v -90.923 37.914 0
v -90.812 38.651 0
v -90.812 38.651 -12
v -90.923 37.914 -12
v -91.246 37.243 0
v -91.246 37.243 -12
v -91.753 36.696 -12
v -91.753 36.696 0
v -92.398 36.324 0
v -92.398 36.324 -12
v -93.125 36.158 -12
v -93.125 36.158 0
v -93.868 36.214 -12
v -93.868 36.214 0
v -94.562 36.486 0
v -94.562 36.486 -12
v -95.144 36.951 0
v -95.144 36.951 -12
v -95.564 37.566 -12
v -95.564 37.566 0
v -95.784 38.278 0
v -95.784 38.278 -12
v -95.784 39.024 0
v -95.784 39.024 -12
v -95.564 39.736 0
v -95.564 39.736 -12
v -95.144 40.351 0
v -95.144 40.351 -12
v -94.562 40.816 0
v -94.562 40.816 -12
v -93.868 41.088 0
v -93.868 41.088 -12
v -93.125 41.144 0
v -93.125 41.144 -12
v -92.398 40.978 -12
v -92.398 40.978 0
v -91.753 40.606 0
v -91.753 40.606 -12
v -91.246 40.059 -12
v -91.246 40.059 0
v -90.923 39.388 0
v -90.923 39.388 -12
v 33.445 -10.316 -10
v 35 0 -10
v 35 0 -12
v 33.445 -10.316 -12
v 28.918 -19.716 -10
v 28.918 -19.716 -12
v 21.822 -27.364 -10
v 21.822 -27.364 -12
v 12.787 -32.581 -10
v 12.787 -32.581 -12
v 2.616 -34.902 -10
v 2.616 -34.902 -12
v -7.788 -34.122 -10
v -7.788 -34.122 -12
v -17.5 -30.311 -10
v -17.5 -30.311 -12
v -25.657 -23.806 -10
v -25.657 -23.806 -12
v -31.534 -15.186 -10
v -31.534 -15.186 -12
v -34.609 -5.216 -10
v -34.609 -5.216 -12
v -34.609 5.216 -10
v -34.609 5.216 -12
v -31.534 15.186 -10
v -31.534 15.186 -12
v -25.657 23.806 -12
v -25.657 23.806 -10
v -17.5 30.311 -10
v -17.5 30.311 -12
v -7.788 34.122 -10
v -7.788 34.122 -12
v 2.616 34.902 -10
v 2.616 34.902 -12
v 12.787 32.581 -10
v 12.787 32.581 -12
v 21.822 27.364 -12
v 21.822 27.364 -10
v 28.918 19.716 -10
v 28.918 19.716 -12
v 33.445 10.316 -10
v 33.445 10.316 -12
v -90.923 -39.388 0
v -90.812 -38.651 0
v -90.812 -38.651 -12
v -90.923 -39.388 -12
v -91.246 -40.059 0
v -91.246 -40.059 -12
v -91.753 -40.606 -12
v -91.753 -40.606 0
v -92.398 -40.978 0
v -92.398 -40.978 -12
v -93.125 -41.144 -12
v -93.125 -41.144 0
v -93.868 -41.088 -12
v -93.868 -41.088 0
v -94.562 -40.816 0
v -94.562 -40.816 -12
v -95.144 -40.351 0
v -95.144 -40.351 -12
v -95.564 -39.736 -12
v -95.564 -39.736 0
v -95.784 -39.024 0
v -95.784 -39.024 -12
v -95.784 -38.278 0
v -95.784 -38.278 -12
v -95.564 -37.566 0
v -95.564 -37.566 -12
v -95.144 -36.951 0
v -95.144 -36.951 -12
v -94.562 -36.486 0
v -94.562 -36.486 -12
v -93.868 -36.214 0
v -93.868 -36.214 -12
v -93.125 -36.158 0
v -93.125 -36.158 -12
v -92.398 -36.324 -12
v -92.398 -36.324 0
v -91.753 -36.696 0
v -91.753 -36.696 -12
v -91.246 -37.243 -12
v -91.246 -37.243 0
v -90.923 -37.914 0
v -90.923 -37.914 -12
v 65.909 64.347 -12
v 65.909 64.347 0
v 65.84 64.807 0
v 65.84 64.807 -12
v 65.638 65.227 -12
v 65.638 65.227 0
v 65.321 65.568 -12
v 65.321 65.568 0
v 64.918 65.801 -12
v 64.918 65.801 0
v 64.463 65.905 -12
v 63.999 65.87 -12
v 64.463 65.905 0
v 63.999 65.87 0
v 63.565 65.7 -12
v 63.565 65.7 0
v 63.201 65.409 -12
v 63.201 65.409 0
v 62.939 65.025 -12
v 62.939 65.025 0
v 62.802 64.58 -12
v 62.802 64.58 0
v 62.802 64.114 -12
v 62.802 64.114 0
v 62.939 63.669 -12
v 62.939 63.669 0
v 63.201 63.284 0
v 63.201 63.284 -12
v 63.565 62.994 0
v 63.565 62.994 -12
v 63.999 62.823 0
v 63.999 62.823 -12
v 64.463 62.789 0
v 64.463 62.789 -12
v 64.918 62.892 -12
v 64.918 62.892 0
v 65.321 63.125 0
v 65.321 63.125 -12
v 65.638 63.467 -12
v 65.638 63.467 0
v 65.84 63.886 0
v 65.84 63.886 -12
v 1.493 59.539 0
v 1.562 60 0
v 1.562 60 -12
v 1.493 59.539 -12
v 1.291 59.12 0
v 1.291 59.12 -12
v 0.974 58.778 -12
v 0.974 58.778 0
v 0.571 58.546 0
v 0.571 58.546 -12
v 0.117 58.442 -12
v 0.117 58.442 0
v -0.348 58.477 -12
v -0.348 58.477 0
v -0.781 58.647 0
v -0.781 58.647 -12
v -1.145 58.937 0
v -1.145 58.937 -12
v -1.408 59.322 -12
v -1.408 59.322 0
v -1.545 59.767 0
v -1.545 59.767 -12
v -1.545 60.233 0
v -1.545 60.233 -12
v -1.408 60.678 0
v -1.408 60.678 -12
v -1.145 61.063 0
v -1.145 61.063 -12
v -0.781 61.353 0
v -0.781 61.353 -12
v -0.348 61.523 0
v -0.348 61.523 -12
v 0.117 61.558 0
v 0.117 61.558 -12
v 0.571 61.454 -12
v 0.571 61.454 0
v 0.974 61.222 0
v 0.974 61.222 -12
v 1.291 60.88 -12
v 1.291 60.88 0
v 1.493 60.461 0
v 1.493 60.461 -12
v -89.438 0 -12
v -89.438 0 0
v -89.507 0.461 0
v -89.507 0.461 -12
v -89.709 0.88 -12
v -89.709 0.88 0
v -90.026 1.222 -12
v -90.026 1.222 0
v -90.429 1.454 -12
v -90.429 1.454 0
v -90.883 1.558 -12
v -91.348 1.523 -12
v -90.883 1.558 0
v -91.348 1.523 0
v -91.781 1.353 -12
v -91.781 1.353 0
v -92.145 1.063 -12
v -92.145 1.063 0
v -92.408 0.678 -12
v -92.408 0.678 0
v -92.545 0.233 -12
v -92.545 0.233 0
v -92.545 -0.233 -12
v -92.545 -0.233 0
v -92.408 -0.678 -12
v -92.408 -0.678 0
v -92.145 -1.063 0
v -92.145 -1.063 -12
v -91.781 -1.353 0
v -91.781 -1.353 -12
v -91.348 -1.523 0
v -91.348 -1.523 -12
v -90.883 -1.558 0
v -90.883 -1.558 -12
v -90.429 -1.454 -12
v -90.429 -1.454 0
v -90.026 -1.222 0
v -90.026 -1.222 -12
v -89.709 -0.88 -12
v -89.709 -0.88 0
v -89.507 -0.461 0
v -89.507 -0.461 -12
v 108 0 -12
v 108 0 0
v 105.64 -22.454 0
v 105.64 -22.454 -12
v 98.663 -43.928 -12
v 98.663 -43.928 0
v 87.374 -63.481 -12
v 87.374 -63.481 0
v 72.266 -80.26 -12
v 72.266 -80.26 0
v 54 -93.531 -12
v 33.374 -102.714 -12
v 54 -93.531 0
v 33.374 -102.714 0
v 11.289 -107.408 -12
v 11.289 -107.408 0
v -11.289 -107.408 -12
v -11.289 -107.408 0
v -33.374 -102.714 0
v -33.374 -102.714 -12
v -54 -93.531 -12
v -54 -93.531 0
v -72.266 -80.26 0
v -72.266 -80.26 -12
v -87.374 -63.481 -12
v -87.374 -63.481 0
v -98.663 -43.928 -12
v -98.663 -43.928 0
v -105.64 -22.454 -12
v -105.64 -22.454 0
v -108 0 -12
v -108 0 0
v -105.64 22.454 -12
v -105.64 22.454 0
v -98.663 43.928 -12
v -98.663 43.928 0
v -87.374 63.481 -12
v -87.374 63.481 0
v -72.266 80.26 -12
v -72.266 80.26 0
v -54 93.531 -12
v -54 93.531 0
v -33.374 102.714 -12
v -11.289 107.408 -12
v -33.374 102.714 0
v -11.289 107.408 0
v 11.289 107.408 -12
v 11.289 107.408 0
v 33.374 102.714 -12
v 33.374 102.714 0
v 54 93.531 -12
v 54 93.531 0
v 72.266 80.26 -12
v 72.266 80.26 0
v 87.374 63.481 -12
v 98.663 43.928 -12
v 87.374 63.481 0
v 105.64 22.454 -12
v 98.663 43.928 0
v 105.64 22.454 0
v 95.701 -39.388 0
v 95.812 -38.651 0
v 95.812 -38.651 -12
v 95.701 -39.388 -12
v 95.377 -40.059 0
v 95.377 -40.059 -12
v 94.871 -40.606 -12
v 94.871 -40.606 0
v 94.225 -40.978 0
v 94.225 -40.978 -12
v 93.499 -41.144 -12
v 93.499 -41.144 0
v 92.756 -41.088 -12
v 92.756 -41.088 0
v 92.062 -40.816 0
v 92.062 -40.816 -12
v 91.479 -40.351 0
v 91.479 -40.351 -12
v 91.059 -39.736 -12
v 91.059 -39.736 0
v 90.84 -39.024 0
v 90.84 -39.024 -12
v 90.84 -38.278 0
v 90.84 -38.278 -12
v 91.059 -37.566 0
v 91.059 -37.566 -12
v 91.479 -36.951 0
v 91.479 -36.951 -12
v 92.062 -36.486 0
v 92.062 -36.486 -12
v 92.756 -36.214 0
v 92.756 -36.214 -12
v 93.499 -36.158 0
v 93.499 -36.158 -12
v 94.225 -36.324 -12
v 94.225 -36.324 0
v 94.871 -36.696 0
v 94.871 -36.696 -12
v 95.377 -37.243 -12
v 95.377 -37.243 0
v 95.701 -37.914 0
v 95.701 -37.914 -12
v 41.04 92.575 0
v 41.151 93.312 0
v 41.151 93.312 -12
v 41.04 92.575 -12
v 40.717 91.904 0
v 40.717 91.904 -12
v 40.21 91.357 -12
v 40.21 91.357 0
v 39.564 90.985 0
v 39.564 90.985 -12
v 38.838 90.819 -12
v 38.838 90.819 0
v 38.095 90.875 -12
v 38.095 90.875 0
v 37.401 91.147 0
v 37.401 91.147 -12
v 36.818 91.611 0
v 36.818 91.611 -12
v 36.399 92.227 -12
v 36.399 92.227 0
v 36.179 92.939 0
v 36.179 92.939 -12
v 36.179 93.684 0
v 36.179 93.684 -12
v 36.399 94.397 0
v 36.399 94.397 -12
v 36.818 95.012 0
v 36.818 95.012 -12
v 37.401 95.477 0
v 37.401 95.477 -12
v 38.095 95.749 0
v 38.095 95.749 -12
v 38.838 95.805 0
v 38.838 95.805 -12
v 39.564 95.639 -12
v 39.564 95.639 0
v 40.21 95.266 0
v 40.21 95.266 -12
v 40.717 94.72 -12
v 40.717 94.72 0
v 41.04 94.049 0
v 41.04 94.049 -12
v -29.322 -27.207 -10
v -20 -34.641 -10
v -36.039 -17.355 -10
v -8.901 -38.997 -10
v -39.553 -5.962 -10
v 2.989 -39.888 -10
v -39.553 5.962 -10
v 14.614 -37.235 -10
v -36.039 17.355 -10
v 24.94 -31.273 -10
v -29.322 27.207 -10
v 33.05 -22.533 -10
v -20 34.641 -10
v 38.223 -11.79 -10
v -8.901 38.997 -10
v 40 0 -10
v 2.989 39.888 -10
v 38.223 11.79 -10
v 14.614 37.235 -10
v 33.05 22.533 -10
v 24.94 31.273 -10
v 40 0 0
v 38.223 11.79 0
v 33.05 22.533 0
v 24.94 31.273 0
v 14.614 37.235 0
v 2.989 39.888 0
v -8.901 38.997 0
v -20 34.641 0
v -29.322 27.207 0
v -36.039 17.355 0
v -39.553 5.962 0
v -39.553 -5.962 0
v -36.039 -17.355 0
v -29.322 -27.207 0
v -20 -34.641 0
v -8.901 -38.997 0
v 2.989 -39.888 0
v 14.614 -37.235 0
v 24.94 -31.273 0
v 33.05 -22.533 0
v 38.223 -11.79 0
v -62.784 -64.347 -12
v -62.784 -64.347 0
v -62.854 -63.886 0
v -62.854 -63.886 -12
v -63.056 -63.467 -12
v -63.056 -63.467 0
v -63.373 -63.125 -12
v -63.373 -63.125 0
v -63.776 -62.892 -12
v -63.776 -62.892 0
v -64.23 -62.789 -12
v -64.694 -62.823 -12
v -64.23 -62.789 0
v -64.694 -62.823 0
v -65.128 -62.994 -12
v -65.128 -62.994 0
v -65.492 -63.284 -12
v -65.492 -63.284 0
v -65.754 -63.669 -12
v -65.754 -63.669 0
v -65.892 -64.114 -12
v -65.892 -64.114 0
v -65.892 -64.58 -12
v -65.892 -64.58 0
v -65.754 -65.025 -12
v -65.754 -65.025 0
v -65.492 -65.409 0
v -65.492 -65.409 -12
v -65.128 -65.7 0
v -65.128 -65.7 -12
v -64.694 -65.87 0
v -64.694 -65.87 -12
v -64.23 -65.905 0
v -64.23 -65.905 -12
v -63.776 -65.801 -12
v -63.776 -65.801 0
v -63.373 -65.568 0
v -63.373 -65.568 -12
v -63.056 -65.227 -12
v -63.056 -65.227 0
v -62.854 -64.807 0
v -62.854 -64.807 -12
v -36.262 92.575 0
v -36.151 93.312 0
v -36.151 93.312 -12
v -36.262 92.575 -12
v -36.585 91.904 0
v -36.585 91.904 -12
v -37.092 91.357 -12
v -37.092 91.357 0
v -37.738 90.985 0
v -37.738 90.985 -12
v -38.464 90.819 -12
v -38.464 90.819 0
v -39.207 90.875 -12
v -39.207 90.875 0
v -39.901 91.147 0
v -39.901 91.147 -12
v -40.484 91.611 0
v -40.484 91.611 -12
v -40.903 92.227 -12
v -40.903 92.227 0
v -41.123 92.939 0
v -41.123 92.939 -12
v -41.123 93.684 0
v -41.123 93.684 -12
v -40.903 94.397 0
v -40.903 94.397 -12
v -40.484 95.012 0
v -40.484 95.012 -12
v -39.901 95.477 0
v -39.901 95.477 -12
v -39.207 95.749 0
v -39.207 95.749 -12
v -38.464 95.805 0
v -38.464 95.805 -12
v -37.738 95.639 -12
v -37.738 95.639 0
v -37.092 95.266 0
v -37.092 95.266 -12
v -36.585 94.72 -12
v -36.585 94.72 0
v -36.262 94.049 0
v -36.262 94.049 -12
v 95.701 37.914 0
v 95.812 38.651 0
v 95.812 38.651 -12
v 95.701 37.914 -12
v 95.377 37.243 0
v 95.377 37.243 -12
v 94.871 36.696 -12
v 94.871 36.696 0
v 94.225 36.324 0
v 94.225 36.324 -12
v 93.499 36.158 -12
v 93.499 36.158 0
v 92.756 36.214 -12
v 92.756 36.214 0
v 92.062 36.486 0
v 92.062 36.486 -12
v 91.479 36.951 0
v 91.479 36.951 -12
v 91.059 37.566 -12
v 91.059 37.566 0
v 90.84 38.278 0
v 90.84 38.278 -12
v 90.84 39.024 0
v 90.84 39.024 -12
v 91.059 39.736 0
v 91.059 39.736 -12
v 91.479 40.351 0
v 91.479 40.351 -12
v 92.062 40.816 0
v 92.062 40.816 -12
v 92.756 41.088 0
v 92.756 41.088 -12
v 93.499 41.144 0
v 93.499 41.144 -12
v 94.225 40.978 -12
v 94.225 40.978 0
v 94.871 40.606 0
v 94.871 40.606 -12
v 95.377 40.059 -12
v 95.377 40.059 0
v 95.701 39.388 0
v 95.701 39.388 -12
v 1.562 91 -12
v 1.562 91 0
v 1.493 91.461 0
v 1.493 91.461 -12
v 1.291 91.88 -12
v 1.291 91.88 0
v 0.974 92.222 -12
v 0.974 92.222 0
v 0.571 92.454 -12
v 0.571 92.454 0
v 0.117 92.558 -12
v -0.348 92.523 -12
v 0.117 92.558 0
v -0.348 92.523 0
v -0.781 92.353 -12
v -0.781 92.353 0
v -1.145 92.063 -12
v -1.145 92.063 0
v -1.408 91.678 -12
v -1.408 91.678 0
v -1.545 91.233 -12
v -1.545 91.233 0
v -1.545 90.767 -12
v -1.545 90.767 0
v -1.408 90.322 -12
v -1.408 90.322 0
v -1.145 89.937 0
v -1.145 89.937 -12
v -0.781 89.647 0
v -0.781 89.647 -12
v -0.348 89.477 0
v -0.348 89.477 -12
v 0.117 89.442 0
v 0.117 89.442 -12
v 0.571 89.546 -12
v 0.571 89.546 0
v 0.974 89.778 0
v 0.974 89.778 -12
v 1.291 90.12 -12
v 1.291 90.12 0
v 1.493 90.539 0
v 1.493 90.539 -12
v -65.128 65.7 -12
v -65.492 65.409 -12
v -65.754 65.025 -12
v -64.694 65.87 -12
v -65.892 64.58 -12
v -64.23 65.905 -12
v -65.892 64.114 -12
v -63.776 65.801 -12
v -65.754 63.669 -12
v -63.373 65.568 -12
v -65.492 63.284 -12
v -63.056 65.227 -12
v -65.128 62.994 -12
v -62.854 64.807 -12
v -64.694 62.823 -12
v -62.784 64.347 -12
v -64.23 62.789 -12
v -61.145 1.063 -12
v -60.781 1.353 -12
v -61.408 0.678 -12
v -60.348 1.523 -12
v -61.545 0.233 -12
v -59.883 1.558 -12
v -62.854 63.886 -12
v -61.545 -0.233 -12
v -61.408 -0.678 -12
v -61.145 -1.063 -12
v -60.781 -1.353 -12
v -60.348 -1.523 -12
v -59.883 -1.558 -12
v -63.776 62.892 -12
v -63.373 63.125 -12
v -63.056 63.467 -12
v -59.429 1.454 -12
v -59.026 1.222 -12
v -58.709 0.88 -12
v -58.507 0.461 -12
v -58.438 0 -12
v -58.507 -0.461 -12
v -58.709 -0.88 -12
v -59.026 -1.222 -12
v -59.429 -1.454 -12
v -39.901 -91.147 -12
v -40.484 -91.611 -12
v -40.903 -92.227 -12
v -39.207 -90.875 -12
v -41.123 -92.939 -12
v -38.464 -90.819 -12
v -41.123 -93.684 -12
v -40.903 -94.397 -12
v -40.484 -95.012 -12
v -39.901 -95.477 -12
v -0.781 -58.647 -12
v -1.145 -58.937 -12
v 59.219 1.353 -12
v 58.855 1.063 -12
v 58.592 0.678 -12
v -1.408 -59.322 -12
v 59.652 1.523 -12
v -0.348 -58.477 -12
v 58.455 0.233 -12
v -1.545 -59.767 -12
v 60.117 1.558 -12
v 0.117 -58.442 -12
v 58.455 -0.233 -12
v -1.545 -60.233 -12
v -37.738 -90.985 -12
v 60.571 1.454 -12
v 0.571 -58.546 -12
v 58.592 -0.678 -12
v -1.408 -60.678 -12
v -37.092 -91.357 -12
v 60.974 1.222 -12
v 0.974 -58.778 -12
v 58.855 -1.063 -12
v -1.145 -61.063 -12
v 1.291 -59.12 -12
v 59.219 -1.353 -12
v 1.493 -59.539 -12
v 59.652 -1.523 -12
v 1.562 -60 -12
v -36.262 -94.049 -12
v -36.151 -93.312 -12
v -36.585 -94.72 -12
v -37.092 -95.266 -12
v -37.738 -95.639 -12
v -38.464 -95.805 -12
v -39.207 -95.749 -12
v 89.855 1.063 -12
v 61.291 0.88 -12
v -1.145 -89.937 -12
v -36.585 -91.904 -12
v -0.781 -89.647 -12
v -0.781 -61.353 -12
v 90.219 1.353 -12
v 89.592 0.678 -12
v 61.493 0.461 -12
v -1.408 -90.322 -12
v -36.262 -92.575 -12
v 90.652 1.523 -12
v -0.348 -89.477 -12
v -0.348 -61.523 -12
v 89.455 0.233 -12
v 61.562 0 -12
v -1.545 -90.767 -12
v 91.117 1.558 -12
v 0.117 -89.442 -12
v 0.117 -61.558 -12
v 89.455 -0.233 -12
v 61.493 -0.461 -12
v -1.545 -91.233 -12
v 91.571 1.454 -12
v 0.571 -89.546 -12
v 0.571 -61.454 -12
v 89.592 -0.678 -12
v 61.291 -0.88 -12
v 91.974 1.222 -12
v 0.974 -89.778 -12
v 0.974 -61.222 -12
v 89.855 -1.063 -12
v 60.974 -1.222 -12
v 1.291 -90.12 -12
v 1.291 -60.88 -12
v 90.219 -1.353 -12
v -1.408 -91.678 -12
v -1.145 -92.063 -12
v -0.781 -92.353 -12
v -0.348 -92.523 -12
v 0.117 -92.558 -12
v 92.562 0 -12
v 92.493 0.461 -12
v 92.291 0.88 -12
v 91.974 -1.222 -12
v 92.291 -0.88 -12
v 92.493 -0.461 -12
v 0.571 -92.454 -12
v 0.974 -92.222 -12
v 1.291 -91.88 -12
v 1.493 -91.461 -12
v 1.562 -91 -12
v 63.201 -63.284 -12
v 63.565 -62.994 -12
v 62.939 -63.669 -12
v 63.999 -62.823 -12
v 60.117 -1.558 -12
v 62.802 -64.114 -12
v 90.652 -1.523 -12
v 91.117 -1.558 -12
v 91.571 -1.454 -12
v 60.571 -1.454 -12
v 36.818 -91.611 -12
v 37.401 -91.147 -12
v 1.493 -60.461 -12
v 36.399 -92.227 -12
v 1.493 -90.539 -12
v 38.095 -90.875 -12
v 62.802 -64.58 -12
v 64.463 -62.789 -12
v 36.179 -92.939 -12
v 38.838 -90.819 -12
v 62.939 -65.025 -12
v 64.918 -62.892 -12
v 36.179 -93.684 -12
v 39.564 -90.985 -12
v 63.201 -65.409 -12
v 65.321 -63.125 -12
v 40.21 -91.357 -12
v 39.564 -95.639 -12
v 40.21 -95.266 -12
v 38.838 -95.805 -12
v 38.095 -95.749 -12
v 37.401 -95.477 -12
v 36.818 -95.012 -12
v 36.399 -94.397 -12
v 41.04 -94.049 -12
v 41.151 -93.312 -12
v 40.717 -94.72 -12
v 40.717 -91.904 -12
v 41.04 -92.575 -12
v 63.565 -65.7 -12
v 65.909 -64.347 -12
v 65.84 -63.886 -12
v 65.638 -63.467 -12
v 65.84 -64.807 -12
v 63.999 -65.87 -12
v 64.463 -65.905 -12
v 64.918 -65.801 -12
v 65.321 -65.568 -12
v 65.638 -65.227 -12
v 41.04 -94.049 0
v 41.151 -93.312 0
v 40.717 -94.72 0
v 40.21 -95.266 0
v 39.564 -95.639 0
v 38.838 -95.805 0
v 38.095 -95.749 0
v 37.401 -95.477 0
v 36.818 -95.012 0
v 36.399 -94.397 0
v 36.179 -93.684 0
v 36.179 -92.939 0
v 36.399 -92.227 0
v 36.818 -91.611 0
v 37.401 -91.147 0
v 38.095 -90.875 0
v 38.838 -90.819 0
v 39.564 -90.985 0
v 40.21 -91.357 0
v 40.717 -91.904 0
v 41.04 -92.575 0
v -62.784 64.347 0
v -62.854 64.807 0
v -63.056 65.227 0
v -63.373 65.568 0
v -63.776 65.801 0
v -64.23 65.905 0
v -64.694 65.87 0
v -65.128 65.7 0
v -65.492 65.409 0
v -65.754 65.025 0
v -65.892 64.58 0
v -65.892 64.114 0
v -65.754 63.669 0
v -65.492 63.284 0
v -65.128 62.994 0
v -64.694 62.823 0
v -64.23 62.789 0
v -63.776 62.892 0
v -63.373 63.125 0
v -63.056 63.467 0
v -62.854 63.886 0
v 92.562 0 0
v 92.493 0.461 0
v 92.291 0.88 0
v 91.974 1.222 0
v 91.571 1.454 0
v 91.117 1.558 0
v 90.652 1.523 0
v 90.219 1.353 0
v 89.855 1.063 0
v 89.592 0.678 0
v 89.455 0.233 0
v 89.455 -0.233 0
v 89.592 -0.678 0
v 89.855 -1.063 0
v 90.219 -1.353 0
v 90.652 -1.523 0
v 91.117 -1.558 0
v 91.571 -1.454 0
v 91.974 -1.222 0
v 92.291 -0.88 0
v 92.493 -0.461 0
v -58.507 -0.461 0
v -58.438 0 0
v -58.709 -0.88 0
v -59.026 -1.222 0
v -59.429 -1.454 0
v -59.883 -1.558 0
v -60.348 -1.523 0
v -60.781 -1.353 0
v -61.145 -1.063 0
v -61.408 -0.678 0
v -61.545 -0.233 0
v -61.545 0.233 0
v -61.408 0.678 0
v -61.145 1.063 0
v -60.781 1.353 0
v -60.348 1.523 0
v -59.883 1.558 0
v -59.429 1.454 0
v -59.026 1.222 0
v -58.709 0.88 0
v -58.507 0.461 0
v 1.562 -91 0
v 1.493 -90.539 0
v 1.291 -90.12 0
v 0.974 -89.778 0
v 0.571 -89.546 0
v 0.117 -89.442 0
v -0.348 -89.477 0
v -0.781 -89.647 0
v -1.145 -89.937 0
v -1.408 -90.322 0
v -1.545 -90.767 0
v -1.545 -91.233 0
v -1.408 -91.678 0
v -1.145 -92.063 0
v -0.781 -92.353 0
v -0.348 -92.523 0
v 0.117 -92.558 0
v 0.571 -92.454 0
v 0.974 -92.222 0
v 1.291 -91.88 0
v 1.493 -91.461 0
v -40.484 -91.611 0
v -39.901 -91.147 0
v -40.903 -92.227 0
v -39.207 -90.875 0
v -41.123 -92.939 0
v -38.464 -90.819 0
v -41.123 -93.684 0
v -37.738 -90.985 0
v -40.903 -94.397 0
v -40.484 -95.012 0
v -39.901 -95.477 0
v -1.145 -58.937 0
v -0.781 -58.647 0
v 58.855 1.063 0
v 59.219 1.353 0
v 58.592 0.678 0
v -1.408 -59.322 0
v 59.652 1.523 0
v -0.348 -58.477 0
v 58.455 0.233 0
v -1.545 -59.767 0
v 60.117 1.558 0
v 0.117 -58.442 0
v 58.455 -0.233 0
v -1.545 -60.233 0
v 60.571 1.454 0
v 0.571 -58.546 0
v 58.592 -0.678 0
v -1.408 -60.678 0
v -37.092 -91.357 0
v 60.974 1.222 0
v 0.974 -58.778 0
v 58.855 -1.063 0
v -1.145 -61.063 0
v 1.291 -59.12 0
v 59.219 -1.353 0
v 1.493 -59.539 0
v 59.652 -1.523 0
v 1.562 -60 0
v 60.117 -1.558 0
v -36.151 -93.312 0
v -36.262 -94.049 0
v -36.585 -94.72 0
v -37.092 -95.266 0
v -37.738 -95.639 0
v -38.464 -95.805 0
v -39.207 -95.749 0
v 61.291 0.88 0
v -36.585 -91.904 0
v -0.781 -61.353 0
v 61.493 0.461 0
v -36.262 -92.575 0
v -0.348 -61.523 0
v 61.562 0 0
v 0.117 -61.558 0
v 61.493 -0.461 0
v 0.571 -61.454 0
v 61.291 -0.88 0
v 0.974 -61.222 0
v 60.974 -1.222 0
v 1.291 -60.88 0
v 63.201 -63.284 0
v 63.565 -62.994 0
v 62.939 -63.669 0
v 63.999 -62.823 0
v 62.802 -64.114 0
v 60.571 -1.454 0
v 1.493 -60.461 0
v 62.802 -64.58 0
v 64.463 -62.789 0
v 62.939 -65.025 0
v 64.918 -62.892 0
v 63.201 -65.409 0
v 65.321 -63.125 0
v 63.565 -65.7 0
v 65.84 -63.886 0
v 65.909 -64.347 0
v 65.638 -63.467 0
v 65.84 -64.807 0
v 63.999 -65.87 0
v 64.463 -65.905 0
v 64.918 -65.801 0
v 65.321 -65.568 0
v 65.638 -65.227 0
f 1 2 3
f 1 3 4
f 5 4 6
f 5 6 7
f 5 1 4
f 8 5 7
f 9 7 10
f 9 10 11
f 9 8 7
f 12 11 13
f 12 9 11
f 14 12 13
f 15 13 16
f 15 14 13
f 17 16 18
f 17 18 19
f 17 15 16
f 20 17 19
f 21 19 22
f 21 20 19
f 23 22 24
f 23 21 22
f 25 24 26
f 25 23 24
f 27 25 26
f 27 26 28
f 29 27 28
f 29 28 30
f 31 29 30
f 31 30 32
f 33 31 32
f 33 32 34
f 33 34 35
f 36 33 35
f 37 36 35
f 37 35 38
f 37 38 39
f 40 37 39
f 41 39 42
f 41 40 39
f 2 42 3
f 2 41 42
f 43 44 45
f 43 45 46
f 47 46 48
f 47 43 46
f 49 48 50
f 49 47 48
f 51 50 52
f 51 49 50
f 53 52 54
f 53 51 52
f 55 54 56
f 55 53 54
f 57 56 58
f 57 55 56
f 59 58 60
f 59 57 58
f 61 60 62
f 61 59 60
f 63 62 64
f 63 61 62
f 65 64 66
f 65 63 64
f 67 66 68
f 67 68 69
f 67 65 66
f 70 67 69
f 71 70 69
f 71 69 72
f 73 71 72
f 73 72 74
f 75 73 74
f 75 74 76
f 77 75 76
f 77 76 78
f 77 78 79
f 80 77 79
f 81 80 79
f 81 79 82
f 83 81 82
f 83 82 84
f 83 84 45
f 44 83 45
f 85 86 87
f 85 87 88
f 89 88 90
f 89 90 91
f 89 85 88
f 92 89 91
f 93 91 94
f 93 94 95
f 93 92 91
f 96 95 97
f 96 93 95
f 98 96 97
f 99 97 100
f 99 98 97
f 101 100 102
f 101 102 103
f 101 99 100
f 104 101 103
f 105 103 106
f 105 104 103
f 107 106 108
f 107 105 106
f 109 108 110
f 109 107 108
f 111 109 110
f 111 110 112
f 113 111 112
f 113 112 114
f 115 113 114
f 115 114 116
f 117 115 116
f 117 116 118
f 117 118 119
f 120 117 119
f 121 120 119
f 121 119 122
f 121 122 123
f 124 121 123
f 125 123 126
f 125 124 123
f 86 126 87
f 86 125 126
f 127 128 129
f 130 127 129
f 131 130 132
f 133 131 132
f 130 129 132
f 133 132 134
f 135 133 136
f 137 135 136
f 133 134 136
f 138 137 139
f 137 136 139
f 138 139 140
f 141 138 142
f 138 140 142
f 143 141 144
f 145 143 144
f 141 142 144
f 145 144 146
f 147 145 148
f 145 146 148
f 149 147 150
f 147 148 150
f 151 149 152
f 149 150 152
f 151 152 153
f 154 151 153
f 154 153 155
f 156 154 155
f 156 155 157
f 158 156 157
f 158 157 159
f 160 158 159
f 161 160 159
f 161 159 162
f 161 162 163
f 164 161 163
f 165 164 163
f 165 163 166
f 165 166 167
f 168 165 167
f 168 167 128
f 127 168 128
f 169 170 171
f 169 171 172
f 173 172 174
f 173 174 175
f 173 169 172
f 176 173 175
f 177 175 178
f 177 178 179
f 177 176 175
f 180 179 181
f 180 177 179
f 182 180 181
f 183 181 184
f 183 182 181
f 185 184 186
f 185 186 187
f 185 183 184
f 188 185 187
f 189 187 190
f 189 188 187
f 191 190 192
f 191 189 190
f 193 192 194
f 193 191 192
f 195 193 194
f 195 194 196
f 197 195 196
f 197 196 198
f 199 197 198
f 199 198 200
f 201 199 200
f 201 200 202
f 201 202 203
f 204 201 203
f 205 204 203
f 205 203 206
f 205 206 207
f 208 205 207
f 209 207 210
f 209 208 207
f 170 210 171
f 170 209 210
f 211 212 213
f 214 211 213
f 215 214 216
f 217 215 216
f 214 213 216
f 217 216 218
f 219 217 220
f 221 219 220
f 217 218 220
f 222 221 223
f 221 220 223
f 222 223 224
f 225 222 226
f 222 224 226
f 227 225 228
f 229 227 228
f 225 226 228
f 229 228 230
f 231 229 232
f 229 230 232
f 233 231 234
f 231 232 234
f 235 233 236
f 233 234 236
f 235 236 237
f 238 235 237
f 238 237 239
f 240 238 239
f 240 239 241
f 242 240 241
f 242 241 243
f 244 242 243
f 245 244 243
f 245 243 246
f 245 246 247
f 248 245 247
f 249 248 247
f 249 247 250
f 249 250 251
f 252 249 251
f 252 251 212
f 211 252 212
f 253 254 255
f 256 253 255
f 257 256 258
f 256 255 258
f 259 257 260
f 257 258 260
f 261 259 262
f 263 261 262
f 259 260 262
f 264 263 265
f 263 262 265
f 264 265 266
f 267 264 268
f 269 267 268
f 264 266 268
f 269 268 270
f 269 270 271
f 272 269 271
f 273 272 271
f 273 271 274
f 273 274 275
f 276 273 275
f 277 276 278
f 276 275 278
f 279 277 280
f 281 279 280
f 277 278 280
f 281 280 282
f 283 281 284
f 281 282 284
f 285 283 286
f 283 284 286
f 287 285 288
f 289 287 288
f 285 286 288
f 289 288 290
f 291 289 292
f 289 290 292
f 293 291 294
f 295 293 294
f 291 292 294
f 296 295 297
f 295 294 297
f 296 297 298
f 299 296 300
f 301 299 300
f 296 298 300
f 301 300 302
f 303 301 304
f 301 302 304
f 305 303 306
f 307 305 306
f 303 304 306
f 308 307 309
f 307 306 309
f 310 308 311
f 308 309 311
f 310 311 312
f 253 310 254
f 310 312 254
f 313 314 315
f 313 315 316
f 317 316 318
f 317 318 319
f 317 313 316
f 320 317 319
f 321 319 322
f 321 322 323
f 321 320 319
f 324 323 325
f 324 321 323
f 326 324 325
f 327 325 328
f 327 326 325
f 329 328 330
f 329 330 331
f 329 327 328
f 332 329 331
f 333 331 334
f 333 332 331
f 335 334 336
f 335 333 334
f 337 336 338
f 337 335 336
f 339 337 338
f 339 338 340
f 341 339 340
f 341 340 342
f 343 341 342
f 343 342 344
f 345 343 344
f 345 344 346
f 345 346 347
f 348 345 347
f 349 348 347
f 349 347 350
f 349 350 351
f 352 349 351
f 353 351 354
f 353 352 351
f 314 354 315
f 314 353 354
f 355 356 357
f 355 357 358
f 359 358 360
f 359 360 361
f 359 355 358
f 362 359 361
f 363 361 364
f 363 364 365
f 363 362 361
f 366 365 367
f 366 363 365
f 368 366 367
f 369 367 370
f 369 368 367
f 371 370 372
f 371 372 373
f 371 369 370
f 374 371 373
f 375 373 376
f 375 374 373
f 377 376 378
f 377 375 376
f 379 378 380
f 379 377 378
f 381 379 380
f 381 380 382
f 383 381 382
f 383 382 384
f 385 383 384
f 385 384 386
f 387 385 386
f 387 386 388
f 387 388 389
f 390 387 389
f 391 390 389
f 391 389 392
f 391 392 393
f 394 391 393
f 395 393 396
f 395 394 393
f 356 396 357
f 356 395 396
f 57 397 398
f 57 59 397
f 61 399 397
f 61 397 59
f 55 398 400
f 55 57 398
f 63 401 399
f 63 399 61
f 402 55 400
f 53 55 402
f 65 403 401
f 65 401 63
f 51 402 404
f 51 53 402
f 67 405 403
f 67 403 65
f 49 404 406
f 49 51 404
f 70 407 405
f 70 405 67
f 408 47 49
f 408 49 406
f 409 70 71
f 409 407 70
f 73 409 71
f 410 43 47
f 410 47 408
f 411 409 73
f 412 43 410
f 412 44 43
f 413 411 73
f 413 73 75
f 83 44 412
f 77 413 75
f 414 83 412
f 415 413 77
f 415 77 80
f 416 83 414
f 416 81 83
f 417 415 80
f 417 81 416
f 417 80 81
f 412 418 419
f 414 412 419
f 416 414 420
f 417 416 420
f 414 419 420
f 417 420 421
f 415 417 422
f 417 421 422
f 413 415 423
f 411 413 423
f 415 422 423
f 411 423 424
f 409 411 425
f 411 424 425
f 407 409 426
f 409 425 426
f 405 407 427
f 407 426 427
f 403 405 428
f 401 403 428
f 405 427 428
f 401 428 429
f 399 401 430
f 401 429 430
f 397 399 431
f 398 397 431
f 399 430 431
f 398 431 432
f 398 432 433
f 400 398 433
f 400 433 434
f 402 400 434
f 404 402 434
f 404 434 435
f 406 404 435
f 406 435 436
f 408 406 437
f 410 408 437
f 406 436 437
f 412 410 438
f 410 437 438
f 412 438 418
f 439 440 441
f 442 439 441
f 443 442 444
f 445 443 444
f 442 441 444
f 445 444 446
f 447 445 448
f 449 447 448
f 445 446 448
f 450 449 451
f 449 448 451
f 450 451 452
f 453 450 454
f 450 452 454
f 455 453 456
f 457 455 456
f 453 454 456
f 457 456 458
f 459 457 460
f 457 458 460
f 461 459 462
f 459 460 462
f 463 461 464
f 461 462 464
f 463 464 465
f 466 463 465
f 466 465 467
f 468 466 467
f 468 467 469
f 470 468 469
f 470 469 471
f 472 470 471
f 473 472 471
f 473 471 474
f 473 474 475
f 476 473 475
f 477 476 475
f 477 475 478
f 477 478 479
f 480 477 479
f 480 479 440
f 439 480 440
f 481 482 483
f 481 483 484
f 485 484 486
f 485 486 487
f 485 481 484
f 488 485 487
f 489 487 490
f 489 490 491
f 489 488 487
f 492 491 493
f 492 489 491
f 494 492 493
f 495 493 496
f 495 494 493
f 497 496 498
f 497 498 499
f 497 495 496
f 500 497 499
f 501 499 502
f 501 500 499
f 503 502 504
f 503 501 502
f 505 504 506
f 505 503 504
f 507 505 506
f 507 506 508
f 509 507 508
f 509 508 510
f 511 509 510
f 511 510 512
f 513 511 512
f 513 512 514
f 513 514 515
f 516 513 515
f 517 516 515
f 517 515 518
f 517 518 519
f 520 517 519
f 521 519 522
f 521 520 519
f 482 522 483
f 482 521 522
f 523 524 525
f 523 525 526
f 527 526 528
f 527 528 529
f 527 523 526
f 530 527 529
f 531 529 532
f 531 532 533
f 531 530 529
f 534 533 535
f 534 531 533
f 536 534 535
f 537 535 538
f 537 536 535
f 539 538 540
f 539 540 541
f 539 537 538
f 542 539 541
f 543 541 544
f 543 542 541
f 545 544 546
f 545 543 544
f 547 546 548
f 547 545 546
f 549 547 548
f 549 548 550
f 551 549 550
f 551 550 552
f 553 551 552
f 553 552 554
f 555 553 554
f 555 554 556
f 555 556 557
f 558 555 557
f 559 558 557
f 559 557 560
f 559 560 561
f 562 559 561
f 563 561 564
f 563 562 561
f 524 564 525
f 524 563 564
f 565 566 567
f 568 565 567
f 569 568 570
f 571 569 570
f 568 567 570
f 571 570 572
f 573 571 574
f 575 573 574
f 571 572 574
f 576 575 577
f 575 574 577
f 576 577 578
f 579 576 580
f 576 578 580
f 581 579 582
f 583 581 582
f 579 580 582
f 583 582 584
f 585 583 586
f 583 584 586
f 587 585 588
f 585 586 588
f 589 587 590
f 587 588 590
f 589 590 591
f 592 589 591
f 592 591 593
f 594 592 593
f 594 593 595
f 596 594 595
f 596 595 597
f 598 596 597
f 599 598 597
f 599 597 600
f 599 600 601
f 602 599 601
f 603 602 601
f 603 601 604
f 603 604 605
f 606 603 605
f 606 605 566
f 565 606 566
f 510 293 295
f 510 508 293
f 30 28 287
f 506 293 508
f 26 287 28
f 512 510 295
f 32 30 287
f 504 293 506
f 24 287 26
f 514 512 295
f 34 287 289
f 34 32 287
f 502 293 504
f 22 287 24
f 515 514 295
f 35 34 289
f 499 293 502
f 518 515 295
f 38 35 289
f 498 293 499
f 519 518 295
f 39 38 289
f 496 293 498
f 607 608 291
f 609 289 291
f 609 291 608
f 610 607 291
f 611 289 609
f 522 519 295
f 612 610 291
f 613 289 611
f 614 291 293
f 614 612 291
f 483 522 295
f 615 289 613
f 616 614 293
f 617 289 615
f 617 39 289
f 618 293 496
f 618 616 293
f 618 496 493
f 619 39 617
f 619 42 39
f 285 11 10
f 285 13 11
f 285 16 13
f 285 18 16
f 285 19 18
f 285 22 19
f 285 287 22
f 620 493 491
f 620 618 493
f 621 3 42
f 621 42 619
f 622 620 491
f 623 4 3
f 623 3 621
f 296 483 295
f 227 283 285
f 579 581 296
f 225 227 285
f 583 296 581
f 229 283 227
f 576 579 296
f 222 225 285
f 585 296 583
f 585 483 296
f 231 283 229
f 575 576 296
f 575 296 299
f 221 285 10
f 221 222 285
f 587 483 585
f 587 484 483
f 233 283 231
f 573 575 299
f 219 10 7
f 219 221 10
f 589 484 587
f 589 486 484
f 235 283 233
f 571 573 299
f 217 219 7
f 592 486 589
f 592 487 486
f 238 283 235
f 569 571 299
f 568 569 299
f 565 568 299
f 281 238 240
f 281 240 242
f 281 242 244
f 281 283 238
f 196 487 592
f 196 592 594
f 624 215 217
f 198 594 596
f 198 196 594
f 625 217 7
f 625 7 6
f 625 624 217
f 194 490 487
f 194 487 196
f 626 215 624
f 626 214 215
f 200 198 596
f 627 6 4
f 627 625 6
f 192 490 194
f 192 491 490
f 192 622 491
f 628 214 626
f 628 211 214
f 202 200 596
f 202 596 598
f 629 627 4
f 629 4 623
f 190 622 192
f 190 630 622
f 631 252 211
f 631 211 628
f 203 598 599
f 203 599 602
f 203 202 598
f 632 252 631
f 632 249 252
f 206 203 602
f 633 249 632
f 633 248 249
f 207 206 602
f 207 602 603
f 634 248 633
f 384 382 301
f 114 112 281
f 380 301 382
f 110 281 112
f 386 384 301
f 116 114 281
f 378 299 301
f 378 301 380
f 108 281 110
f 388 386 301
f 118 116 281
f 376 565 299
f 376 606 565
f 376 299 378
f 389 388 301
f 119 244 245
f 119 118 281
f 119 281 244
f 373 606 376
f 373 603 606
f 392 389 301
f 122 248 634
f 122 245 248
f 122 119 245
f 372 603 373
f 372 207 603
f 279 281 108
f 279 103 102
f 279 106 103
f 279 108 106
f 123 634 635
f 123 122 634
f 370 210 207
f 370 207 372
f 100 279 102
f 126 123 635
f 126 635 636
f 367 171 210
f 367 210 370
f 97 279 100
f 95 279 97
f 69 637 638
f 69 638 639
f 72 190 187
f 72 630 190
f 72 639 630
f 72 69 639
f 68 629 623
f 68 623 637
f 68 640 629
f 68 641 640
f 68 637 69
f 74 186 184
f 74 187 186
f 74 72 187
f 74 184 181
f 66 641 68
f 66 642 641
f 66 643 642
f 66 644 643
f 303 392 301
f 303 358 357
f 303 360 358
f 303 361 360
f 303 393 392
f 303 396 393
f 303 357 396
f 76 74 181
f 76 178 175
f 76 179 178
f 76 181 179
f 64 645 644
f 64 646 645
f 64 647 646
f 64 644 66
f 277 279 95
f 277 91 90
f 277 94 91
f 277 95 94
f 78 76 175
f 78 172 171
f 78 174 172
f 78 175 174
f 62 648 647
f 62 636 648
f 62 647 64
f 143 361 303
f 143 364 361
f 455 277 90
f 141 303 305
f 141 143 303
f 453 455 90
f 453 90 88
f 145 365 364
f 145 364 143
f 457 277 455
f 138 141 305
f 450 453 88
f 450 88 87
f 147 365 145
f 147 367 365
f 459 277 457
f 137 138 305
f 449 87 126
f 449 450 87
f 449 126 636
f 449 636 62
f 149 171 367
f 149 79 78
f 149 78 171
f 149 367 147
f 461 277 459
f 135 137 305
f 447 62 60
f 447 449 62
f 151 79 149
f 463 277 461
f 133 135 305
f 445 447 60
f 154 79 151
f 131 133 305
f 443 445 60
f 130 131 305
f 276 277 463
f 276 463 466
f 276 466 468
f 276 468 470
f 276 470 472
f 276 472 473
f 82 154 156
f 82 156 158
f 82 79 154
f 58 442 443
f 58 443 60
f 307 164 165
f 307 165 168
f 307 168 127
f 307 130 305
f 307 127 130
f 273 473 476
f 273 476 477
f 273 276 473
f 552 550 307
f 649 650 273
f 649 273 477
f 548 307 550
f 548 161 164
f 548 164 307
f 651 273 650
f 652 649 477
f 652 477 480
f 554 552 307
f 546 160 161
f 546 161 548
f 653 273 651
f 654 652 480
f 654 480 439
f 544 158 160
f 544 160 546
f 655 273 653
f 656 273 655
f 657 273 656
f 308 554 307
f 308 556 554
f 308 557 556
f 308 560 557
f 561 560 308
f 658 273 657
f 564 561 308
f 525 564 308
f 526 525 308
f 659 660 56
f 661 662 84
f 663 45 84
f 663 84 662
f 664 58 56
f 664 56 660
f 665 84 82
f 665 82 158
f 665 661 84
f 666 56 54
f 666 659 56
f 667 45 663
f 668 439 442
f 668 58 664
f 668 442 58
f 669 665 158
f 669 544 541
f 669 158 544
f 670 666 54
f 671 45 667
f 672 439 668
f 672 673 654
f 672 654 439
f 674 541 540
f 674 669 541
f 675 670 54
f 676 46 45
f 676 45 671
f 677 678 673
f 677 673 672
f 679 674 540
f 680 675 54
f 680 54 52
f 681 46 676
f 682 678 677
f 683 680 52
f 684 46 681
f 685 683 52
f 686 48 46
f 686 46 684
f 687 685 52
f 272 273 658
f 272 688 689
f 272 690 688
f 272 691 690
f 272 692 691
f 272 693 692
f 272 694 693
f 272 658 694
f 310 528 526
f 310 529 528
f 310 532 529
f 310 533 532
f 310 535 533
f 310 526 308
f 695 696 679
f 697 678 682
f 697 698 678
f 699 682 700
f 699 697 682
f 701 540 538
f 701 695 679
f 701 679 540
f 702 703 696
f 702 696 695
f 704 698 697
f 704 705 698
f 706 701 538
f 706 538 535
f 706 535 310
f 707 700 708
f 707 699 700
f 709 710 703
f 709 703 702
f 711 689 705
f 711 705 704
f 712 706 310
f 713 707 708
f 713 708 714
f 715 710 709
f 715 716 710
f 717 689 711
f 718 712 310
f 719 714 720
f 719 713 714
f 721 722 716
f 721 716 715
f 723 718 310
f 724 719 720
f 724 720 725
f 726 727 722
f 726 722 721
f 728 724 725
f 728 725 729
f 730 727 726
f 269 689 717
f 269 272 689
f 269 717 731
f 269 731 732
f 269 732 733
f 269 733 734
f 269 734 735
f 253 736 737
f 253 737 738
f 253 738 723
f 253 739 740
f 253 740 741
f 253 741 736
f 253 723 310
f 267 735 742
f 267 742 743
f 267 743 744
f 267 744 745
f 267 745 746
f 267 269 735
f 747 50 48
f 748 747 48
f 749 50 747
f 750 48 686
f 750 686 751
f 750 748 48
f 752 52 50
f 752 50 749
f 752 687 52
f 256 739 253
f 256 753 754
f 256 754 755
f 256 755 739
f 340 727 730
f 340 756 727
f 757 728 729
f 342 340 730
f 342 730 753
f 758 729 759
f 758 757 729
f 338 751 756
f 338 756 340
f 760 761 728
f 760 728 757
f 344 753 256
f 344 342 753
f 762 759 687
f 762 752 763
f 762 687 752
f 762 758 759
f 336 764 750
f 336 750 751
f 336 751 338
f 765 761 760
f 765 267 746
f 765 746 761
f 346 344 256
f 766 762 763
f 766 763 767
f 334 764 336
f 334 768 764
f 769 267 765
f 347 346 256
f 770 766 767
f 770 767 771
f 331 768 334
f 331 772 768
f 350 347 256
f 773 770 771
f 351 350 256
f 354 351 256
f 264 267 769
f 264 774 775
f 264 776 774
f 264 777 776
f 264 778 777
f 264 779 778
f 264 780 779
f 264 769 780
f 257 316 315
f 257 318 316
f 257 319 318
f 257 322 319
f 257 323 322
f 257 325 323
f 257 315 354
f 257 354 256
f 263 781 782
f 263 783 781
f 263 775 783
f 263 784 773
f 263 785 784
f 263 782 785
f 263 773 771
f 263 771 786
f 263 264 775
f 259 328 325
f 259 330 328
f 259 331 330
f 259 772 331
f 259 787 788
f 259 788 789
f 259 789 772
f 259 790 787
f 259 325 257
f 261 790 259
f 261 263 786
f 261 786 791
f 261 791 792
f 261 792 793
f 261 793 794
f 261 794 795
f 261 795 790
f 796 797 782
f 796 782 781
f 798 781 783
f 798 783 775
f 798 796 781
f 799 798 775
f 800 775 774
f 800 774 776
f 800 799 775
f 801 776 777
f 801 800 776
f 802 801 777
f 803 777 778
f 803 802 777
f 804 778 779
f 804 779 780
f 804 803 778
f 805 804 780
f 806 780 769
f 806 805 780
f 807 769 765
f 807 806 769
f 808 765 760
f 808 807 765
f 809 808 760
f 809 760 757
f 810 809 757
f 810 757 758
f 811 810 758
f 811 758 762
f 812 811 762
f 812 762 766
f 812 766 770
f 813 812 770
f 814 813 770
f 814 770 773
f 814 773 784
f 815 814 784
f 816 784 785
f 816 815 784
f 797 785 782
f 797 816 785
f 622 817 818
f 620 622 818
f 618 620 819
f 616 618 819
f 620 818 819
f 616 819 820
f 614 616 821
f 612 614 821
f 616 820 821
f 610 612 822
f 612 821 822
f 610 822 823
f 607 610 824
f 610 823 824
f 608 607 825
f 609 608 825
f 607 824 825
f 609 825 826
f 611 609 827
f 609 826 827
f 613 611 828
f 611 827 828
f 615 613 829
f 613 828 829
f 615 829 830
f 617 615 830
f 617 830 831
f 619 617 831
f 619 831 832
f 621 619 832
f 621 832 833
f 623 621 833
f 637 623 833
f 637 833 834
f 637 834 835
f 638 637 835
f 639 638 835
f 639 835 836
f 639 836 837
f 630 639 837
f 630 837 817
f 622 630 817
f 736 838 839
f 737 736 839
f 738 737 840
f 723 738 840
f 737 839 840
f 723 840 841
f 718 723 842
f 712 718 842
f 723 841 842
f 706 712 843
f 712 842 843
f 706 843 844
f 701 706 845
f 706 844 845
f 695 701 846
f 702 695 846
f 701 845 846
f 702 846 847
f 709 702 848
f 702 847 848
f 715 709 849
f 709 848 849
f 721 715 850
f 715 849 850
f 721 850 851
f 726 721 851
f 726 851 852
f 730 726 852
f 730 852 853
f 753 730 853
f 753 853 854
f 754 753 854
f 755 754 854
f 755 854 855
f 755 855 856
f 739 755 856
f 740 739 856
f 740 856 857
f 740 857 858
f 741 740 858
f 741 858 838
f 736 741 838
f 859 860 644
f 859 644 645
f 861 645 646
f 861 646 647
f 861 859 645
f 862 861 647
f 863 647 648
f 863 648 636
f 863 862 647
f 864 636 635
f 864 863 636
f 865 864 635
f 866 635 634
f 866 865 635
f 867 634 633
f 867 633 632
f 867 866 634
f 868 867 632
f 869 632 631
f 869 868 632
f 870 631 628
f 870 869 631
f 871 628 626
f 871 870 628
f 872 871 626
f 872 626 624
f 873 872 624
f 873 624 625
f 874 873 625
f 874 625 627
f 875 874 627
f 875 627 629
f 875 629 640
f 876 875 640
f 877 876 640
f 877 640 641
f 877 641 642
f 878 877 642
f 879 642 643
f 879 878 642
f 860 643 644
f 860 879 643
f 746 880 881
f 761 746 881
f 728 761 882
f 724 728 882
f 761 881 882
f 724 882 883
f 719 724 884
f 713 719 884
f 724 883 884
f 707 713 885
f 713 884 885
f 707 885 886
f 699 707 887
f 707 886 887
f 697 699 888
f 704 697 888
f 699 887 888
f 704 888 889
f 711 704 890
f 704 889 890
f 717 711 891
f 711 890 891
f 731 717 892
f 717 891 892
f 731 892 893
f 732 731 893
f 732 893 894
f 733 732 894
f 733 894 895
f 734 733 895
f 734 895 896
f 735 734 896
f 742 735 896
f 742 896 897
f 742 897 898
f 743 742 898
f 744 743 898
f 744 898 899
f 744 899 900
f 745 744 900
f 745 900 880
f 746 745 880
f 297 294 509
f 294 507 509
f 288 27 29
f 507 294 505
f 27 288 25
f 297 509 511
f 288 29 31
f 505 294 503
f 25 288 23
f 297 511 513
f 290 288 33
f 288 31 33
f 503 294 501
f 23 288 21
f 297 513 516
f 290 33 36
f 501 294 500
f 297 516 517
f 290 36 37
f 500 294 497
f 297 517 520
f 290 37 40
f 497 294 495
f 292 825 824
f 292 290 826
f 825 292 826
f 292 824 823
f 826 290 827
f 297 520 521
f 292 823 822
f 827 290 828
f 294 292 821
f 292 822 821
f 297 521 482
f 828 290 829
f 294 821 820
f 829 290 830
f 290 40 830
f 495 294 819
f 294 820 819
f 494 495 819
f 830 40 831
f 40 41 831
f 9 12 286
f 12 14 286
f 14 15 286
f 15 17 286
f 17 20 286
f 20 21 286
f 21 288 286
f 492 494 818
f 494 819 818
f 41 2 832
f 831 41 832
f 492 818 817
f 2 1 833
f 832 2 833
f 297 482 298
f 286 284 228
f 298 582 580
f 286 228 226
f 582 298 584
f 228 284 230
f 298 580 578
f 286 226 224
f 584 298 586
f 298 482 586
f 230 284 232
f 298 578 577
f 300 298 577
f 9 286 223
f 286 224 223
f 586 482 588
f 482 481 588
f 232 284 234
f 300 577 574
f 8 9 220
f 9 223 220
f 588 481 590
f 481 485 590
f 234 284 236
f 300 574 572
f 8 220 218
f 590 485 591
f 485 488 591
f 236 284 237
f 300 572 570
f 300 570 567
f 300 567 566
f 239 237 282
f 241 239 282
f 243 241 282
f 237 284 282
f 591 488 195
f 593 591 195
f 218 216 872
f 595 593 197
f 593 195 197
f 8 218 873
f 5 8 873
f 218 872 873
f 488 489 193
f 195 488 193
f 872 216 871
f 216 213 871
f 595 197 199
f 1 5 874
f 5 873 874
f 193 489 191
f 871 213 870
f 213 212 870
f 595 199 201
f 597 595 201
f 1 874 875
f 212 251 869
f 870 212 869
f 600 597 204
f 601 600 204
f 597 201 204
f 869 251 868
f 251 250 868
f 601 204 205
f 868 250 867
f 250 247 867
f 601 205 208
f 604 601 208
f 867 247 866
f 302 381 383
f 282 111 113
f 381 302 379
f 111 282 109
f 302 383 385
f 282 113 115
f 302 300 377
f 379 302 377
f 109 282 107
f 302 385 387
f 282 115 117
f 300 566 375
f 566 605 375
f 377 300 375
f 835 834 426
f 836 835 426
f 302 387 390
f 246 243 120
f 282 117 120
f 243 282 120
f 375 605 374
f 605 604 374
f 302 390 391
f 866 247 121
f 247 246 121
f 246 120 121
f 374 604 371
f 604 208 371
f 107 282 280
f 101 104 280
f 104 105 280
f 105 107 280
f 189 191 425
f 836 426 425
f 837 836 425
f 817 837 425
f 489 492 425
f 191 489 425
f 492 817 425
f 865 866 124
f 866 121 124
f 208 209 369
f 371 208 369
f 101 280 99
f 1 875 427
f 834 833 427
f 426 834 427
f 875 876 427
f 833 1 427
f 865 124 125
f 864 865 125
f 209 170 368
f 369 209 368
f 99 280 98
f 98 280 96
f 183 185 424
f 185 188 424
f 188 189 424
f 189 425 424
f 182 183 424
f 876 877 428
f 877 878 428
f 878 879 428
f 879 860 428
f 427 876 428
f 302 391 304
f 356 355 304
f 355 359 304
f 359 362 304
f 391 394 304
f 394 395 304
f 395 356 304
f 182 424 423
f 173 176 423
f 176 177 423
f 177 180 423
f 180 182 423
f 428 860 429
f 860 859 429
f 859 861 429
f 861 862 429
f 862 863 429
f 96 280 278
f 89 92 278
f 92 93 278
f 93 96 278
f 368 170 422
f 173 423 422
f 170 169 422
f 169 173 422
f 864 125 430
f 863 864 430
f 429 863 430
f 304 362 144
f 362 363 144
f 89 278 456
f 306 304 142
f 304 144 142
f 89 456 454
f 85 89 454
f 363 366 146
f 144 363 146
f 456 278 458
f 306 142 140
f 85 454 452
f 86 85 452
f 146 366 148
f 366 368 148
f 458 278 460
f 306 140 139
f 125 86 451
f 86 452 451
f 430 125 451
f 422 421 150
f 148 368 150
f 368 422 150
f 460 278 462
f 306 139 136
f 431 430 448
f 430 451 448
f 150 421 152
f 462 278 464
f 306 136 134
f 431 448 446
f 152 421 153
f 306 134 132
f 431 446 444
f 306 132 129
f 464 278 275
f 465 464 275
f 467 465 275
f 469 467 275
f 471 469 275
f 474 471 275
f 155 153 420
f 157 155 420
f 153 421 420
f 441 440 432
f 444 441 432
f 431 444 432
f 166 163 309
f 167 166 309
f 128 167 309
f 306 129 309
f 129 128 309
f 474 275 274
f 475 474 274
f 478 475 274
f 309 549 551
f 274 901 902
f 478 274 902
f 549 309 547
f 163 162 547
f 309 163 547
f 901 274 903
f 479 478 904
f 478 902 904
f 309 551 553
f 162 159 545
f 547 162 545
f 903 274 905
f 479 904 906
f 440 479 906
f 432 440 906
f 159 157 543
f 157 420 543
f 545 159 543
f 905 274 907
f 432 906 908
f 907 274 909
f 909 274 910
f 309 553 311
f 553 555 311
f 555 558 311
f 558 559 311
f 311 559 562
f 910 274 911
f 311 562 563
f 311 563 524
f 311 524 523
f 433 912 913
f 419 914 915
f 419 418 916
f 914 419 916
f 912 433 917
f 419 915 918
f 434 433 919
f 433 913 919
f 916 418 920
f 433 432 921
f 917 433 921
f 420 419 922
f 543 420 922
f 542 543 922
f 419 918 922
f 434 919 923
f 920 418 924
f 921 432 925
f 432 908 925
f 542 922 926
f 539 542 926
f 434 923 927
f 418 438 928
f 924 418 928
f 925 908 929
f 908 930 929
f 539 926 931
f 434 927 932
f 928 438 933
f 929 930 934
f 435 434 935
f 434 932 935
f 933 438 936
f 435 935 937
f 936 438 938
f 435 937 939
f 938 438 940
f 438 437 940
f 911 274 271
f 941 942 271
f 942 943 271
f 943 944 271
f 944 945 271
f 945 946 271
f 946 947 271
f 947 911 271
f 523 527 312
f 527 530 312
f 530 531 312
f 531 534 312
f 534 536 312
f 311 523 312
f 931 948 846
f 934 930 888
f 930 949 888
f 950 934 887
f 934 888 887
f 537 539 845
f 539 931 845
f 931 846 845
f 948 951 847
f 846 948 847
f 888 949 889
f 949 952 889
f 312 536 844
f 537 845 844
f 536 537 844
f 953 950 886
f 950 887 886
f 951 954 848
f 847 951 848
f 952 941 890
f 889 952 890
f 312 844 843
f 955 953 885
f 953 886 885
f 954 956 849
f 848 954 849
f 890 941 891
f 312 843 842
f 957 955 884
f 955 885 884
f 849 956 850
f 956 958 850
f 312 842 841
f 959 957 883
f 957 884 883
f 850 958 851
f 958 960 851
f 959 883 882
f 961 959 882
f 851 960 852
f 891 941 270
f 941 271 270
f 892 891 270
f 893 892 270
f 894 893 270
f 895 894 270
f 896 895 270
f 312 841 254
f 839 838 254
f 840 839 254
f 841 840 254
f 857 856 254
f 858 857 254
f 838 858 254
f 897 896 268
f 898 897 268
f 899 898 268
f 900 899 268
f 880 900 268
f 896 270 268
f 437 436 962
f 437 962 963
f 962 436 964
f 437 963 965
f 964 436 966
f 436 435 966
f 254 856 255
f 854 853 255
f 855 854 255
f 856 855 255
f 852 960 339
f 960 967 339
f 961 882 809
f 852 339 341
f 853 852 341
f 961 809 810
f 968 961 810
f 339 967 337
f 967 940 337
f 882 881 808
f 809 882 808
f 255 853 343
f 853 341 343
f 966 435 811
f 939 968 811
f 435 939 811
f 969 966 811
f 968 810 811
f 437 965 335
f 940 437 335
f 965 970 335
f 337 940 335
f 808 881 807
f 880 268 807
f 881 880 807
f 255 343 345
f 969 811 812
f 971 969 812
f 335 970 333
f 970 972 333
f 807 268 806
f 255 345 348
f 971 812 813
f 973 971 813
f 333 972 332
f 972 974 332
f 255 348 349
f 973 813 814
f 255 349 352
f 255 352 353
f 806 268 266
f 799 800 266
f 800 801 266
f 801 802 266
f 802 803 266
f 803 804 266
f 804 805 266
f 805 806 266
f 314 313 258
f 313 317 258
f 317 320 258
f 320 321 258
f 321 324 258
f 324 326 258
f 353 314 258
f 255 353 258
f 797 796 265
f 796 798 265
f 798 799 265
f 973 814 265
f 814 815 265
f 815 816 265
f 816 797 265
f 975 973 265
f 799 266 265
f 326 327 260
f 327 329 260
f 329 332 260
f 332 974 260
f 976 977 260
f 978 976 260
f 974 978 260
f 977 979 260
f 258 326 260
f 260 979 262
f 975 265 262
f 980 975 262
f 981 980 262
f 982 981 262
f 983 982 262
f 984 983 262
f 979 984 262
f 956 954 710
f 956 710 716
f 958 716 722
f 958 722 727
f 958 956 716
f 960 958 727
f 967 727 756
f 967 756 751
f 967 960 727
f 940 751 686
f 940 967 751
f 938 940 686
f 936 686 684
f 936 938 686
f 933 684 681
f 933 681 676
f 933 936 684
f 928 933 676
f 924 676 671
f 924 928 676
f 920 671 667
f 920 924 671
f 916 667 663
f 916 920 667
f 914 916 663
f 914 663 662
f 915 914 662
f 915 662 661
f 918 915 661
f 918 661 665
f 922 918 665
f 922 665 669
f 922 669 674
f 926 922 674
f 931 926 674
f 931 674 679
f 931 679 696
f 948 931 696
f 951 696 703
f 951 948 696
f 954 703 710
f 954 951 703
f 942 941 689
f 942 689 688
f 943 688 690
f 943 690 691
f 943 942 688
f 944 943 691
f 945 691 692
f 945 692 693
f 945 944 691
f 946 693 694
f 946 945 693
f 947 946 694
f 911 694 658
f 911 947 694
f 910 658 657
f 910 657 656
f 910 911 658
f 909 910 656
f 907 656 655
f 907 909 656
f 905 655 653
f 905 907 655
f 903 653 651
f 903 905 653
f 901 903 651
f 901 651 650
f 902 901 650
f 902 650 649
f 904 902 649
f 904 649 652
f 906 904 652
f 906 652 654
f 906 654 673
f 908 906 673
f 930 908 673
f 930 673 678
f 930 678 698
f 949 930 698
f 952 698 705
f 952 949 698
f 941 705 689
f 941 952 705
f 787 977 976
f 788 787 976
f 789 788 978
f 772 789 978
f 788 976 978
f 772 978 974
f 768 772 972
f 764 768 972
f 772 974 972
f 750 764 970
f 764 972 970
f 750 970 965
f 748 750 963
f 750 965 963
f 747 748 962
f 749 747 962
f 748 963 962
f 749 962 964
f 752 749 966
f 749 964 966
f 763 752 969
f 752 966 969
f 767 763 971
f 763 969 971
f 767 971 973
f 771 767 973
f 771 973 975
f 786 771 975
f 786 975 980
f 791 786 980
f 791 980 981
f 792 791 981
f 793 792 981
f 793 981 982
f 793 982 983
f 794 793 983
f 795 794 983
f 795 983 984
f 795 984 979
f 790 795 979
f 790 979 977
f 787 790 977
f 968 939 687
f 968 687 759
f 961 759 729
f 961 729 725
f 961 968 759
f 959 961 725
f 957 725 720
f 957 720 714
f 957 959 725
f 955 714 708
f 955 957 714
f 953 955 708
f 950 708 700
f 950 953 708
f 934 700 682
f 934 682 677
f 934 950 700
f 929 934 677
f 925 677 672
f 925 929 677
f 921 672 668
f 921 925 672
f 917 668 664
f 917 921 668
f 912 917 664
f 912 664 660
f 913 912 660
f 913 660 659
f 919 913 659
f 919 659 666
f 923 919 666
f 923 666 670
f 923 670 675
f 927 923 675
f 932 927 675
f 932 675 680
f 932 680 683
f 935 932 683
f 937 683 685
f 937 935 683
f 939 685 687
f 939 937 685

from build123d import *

# Parameters (mm, degrees)
SKETCH001_R     = 108
SKETCH001_R_2   = 35
SKETCH001_R_3   = 2.5
SKETCH001_R_4   = 1.5625
PAD_DEPTH       = 12
SKETCH_R        = 1.5625
POCKET_DEPTH    = 12.001
SKETCH002_R     = 40
POCKET001_DEPTH = 10


with BuildPart() as part:
    # Sketch001 → Pad (new body)
    with BuildSketch(Plane(origin=(0, 0, 0), x_dir=(1, 0, 0), z_dir=(0, 0, -1))):
        Circle(SKETCH001_R)
        Circle(SKETCH001_R_2, mode=Mode.SUBTRACT)
        with Locations((38.651027, 93.311833)):
            Circle(SKETCH001_R_3, mode=Mode.SUBTRACT)
        with Locations((93.311833, 38.651027)):
            Circle(SKETCH001_R_3, mode=Mode.SUBTRACT)
        with Locations((93.311833, -38.651027)):
            Circle(SKETCH001_R_3, mode=Mode.SUBTRACT)
        with Locations((38.651027, -93.311833)):
            Circle(SKETCH001_R_3, mode=Mode.SUBTRACT)
        with Locations((-38.651027, 93.311833)):
            Circle(SKETCH001_R_3, mode=Mode.SUBTRACT)
        with Locations((-93.311833, 38.651027)):
            Circle(SKETCH001_R_3, mode=Mode.SUBTRACT)
        with Locations((-93.311833, -38.651027)):
            Circle(SKETCH001_R_3, mode=Mode.SUBTRACT)
        with Locations((-38.651027, -93.311833)):
            Circle(SKETCH001_R_3, mode=Mode.SUBTRACT)
        with Locations((0, 60)):
            Circle(SKETCH001_R_4, mode=Mode.SUBTRACT)
        with Locations((-60, 0)):
            Circle(SKETCH001_R_4, mode=Mode.SUBTRACT)
        with Locations((0, -60)):
            Circle(SKETCH001_R_4, mode=Mode.SUBTRACT)
        with Locations((60, 0)):
            Circle(SKETCH001_R_4, mode=Mode.SUBTRACT)
    extrude(amount=PAD_DEPTH)

    # Sketch → Pocket (cut, through all)
    with BuildSketch(Plane.XY):
        with Locations((64.346717, 64.346717)):
            Circle(SKETCH_R)
        with Locations((0, 91)):
            Circle(SKETCH_R)
        with Locations((91, 0)):
            Circle(SKETCH_R)
        with Locations((64.346717, -64.346717)):
            Circle(SKETCH_R)
        with Locations((0, -91)):
            Circle(SKETCH_R)
        with Locations((-91, 0)):
            Circle(SKETCH_R)
        with Locations((-64.346717, -64.346717)):
            Circle(SKETCH_R)
        with Locations((-64.346717, 64.346717)):
            Circle(SKETCH_R)
    extrude(amount=-POCKET_DEPTH, mode=Mode.SUBTRACT)

    # Sketch002 (on Face2 of Pocket) → Pocket001 (cut)
    with BuildSketch(Plane.XY):
        Circle(SKETCH002_R)
    extrude(amount=-POCKET001_DEPTH, mode=Mode.SUBTRACT)


solid = part.part
